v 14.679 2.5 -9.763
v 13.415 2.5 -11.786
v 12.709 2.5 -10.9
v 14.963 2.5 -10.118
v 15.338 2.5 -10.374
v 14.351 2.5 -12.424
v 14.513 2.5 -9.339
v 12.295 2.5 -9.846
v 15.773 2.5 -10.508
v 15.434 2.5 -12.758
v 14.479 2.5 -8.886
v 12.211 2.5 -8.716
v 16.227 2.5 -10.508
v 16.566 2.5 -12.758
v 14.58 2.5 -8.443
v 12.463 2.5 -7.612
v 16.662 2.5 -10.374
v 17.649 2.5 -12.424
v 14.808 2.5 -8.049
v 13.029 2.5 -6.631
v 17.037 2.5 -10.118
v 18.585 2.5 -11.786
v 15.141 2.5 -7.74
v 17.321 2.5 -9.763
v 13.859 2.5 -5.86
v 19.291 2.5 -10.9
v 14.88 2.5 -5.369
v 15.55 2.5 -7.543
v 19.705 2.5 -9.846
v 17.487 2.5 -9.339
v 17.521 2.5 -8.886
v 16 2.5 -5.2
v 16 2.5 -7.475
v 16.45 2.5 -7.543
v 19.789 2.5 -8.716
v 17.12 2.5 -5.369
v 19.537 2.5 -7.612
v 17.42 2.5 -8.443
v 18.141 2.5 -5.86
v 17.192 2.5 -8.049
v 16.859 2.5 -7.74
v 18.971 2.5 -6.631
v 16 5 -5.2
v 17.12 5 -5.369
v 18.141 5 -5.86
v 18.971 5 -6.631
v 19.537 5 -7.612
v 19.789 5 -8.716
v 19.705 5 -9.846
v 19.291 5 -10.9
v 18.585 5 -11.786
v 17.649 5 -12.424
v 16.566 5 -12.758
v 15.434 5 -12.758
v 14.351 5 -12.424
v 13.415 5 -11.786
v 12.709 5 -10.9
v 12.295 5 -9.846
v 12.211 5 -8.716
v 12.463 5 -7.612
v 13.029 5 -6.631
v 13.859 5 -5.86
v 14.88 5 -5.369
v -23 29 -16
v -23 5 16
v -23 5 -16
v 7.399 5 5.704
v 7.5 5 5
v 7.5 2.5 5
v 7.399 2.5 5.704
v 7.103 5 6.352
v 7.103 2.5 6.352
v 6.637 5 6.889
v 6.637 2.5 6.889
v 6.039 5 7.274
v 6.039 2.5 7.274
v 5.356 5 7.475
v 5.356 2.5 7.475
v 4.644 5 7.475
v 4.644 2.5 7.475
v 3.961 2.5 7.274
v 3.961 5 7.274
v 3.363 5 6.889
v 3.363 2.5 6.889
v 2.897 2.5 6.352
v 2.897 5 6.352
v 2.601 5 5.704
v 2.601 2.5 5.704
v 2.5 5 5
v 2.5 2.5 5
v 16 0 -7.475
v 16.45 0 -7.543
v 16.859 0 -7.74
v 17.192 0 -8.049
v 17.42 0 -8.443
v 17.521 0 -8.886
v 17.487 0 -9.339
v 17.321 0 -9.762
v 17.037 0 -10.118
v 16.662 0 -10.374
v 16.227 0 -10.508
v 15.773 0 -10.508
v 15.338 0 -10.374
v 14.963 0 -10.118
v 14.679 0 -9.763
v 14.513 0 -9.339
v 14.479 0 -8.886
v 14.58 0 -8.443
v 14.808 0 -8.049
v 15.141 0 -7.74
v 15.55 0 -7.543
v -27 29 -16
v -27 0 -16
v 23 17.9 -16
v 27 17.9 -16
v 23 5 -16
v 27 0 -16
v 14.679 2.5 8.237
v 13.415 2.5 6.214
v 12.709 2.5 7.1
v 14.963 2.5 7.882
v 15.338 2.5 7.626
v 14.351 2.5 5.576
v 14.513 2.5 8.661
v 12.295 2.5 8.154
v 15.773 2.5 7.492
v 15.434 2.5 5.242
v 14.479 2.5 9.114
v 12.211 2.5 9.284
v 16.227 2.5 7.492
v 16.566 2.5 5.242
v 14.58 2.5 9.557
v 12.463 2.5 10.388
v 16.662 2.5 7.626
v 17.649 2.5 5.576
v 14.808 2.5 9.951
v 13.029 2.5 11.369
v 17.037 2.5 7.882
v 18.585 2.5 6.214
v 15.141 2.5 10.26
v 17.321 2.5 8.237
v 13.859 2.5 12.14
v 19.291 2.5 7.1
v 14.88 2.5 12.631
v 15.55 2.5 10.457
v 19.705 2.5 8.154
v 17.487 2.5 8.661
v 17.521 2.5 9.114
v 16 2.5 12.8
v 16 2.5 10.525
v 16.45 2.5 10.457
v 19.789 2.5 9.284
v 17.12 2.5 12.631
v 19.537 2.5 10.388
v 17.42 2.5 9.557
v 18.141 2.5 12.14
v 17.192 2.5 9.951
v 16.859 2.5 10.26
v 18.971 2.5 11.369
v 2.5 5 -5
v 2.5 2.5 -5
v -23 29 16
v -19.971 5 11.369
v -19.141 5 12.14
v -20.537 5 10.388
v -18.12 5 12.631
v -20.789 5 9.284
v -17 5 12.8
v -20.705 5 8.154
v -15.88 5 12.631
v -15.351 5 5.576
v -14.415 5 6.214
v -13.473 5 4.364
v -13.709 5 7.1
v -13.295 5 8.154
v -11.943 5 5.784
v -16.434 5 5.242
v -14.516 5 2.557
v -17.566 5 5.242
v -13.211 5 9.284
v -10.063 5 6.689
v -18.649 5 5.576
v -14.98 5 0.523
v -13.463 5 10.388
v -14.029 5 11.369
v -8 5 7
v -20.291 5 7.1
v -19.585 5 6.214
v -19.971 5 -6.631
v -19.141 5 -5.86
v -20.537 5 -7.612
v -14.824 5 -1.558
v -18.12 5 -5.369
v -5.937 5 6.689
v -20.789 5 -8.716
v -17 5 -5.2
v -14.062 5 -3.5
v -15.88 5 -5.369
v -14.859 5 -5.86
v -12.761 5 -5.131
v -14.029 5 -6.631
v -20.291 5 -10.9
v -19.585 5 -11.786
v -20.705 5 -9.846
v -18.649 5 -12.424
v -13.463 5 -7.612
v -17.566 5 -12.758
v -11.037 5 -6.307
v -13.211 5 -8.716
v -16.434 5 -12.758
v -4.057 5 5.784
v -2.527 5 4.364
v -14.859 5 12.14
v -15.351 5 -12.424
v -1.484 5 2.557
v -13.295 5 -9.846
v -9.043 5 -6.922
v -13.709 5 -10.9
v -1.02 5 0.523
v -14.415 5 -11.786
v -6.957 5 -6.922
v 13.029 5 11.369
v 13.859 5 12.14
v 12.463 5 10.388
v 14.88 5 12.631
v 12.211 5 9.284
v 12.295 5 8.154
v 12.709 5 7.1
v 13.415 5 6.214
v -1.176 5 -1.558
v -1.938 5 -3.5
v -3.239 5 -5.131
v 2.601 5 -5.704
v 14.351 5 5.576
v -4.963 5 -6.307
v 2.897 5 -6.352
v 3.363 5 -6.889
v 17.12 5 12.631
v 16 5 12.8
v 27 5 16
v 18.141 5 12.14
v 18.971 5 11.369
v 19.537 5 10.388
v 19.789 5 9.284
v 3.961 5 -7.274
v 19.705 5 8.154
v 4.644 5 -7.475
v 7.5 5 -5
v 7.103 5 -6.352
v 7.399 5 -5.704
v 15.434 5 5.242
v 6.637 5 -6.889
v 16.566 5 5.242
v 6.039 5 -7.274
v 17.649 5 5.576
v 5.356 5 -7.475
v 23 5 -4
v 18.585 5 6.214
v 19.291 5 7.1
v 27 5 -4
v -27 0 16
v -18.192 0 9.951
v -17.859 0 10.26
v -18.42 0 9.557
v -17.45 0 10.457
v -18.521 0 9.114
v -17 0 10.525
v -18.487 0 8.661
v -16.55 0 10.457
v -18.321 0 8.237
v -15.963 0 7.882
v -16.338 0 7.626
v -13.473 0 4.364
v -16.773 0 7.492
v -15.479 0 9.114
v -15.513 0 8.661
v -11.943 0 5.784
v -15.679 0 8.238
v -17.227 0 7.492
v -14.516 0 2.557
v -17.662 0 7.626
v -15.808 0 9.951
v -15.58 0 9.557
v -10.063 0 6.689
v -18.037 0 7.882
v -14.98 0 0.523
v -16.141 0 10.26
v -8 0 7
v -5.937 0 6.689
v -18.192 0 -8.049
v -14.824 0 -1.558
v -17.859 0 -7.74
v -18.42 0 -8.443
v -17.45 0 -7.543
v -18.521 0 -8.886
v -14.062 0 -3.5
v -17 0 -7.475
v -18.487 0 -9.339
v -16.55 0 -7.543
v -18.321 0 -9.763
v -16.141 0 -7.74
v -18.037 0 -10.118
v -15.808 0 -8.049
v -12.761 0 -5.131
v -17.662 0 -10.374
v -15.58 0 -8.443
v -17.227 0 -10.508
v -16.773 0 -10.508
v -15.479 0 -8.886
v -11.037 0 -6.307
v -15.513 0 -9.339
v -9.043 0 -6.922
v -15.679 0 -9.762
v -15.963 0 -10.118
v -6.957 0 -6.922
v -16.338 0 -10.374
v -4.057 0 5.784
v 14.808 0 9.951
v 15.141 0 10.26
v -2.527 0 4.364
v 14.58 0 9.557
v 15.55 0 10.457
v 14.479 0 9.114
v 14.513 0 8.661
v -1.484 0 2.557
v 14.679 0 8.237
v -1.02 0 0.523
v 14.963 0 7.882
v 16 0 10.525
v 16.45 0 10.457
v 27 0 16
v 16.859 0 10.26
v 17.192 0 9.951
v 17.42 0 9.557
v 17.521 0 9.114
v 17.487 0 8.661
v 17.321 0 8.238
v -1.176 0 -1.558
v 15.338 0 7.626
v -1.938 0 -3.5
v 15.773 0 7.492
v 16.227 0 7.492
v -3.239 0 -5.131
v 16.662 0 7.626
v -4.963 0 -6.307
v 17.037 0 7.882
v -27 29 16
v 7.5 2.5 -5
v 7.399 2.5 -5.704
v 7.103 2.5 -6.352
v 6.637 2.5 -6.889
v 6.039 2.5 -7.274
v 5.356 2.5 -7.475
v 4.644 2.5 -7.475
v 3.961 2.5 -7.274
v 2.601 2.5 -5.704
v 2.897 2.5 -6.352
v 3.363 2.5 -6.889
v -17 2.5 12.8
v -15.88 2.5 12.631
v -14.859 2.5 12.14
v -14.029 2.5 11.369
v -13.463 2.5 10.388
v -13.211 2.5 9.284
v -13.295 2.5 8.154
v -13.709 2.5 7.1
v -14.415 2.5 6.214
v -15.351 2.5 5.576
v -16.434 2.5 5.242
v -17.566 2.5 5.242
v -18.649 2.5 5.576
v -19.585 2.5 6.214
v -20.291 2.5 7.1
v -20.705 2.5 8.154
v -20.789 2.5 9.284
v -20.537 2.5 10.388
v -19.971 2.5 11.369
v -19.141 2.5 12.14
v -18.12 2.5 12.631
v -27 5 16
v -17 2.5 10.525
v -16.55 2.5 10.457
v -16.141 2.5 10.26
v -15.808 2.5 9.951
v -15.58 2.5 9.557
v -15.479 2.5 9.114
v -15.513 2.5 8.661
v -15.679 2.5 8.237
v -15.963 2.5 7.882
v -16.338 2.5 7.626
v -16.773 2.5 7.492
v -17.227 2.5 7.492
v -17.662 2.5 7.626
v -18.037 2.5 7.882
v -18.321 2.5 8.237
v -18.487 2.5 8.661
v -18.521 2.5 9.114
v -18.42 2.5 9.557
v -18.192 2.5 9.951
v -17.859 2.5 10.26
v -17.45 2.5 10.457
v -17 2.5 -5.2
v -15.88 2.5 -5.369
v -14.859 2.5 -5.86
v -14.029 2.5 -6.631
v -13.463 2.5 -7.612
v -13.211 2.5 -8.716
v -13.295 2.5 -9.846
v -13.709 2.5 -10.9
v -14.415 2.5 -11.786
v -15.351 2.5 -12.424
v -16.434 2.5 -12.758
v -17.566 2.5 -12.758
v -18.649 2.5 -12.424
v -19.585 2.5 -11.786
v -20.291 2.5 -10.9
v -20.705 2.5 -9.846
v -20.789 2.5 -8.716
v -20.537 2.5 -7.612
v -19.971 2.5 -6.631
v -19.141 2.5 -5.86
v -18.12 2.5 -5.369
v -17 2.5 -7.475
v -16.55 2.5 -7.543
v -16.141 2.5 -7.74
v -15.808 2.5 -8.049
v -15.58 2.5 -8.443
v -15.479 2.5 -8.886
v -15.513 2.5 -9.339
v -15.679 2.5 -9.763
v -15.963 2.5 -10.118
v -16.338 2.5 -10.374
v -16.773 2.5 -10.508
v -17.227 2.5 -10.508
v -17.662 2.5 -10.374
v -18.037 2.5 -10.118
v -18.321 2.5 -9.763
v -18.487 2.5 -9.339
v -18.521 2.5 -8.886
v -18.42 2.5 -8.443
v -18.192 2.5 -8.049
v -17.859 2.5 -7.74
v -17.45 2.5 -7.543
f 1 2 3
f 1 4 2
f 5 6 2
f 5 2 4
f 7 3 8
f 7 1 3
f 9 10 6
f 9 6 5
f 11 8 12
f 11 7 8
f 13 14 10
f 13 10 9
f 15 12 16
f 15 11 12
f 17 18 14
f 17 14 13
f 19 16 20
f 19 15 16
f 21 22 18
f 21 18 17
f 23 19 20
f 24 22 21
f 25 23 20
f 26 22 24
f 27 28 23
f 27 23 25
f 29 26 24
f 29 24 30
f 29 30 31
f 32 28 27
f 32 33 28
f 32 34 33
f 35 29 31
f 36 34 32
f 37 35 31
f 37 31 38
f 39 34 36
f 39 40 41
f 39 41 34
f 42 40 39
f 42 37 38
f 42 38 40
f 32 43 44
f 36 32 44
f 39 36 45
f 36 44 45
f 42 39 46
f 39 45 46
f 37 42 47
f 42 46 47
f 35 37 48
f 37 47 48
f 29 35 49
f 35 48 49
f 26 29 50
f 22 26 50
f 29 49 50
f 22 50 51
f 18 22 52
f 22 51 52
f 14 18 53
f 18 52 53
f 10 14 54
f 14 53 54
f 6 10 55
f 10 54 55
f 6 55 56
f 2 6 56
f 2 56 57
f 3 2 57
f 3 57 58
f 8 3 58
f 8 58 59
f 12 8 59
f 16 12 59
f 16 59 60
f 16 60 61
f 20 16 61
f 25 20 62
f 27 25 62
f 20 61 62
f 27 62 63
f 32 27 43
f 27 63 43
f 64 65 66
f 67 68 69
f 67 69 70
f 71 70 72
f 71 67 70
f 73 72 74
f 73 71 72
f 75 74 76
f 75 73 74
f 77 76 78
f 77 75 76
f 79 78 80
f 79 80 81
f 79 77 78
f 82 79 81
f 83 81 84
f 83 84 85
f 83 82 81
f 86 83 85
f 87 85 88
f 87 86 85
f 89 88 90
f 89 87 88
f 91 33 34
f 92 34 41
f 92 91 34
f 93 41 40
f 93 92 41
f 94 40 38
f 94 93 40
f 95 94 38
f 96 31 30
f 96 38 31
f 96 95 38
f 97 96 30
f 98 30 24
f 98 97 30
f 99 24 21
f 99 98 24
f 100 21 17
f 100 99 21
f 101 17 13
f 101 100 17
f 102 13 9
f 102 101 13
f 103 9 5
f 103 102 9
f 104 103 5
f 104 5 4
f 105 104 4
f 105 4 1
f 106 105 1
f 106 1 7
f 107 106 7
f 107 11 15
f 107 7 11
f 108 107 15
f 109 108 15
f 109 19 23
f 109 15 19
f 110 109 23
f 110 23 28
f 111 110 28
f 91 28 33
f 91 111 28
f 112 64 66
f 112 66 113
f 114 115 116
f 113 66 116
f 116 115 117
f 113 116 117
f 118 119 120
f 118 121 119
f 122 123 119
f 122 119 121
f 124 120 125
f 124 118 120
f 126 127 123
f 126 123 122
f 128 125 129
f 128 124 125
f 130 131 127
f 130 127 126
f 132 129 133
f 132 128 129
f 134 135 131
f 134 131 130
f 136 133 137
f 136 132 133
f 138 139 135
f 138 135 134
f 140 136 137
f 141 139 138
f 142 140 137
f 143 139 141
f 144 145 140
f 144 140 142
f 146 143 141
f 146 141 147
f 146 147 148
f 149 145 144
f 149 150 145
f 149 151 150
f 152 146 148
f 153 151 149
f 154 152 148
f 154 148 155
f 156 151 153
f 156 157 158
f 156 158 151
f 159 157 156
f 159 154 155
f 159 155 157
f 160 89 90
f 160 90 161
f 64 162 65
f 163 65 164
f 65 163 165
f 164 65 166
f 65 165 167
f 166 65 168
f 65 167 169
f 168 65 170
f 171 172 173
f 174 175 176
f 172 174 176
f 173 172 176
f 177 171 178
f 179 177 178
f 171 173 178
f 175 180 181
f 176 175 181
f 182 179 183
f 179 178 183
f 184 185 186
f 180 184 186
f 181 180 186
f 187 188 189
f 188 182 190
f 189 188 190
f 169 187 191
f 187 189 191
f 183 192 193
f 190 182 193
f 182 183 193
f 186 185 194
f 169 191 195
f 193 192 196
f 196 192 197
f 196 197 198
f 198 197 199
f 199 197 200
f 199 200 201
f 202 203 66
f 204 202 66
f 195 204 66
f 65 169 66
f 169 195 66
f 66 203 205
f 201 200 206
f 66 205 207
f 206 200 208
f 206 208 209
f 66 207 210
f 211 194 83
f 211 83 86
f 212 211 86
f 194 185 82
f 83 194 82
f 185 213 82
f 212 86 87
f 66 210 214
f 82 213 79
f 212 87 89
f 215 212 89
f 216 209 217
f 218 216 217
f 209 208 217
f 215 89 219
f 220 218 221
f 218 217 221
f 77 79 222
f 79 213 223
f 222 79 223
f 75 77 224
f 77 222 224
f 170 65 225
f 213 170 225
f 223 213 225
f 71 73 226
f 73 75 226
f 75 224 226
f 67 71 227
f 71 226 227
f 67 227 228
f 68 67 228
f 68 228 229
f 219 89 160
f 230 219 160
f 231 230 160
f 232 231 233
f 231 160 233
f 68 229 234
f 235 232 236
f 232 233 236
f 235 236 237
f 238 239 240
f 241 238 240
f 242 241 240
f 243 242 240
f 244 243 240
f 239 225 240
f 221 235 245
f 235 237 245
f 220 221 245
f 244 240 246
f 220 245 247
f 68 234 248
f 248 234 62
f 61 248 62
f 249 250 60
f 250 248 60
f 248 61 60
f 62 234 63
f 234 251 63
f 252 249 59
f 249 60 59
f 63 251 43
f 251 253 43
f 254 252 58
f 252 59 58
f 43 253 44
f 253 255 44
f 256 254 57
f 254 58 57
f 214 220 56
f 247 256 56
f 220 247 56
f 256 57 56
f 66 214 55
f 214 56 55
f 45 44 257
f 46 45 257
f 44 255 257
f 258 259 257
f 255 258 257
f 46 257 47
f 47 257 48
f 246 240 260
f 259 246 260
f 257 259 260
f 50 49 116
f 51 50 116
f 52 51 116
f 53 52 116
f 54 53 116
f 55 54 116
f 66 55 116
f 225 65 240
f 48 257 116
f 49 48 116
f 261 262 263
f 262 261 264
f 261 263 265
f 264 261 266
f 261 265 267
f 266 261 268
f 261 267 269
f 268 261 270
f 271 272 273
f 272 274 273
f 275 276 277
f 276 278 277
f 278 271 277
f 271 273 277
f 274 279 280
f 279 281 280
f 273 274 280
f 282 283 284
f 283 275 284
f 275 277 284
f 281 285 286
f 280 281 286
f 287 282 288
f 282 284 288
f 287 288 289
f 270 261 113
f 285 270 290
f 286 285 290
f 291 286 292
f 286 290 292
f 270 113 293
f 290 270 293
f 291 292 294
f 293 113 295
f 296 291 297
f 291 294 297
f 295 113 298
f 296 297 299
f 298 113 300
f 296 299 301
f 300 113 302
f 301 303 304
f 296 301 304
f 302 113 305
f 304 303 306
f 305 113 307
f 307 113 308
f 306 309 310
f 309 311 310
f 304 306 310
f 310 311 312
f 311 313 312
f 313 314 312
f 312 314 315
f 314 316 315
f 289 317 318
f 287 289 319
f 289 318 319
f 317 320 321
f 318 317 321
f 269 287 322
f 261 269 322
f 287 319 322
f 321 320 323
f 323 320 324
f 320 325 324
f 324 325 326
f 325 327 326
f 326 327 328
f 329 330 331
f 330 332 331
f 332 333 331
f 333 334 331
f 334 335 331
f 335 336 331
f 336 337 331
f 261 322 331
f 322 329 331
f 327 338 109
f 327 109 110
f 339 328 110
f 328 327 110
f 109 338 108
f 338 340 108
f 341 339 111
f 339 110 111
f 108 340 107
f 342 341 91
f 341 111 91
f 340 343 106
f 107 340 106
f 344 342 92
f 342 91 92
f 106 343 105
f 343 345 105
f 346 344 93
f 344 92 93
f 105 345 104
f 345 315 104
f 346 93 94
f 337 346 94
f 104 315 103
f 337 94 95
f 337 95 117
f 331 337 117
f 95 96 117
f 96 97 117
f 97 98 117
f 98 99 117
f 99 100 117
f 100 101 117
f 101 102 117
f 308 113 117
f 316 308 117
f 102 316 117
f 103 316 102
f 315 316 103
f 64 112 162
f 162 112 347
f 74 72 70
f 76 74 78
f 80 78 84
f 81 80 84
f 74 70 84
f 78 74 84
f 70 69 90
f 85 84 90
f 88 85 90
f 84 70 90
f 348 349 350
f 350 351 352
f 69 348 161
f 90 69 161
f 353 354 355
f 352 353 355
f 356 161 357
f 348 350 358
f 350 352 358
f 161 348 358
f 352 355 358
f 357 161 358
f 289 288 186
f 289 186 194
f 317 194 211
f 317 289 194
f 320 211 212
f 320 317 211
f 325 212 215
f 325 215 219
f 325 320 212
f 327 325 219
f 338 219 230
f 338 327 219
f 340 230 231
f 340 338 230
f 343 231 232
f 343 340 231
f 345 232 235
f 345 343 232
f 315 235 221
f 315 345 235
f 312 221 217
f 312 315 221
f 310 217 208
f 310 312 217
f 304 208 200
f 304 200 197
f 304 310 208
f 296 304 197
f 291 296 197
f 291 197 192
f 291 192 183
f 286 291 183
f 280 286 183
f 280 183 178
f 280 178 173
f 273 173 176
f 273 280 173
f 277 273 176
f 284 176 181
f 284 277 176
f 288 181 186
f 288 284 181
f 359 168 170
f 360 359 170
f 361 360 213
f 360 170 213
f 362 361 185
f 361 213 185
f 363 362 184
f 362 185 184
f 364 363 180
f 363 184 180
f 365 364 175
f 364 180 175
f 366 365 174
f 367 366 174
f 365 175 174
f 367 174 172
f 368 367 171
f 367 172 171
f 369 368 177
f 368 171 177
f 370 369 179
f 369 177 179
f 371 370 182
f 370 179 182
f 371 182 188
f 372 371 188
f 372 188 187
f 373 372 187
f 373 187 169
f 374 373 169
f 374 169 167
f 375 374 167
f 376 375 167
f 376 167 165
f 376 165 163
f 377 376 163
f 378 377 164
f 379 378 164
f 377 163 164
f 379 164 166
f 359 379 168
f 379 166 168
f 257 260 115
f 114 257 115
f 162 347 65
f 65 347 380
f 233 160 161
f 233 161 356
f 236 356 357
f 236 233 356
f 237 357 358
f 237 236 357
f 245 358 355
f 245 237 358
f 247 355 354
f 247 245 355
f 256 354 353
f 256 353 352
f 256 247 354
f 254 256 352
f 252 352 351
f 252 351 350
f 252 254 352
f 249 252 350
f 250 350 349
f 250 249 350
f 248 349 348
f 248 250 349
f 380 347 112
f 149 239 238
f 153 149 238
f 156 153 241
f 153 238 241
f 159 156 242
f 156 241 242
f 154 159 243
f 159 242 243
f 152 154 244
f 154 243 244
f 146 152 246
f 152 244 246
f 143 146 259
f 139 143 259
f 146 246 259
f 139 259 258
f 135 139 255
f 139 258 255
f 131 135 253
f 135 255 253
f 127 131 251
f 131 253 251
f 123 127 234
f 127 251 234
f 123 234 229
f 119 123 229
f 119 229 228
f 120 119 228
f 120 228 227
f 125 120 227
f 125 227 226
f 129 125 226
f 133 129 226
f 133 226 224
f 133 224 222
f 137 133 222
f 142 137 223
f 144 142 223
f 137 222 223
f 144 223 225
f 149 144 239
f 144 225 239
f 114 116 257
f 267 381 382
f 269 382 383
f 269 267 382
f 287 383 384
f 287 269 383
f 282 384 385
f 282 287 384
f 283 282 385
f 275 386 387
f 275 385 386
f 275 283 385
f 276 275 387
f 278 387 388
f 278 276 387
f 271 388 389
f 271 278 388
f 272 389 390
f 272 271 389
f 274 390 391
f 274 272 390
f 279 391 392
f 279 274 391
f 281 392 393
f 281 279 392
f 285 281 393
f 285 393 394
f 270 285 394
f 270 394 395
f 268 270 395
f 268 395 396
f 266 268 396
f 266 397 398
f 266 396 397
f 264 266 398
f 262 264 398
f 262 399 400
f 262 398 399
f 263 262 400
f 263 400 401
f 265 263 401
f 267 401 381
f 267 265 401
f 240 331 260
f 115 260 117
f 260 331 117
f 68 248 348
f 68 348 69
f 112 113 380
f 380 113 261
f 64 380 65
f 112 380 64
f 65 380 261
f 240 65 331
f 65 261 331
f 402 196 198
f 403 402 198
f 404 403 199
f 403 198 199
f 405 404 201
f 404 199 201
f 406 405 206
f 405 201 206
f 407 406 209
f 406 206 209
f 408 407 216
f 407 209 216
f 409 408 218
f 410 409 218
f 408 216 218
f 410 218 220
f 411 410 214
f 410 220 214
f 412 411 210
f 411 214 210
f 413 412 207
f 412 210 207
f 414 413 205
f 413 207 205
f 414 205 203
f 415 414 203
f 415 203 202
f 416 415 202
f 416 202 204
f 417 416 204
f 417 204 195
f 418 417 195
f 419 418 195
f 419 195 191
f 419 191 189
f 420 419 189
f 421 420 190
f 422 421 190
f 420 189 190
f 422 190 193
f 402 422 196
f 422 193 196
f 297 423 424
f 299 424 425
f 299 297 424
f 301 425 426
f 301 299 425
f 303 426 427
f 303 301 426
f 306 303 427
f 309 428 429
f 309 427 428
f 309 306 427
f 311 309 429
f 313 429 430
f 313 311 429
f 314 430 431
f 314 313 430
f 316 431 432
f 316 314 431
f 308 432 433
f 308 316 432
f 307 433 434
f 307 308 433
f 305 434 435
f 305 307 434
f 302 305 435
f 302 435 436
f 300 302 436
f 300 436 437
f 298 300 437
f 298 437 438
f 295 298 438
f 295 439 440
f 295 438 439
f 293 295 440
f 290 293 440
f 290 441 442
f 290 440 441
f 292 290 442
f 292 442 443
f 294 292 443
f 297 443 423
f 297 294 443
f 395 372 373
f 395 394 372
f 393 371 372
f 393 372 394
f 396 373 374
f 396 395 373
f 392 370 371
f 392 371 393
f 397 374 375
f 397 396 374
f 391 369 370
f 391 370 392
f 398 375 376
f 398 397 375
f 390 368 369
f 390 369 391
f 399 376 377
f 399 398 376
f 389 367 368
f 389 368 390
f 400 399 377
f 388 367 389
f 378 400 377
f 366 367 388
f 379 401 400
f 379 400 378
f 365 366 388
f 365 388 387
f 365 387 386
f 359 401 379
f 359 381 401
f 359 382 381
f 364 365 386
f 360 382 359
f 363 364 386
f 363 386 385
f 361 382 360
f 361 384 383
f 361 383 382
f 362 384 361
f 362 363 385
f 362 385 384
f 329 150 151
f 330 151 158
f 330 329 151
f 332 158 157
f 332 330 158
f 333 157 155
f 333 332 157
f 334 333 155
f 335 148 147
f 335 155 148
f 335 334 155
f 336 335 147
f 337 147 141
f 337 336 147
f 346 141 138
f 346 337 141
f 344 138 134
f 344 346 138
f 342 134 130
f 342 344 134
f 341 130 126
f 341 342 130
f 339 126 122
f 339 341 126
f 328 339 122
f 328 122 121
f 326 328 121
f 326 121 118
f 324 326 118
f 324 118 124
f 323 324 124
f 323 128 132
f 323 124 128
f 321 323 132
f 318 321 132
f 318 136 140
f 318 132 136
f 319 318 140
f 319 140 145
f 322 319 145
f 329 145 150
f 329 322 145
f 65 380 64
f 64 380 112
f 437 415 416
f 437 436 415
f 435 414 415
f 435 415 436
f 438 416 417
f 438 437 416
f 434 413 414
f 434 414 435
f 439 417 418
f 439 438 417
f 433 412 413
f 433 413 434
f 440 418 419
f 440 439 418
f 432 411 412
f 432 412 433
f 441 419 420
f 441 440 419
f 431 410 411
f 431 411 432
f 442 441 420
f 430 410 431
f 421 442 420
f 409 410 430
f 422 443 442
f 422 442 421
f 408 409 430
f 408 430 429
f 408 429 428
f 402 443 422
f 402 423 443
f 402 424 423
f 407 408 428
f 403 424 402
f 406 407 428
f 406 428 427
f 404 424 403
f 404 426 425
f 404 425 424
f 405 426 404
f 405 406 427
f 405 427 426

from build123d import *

# Parameters (mm, degrees)
SKETCH2_W           = 46
SKETCH2_H           = 32
SKETCH2_R           = 1.525
SKETCH2_R_2         = 7
BOSS_EXTRUDE1_DEPTH = 5
SKETCH3_R           = 3.8
CUT_EXTRUDE1_DEPTH  = 2.5
BOSS_EXTRUDE2_DEPTH = 87.8
BOSS_EXTRUDE3_START = 82.8
SKETCH2_2_W         = 46
SKETCH2_2_H         = 32
SKETCH2_2_R         = 1.525
SKETCH2_2_R_2       = 7
BOSS_EXTRUDE3_DEPTH = 5
CUT_EXTRUDE2_START  = 80.3
SKETCH3_3_R         = 3.8
CUT_EXTRUDE2_DEPTH  = 2.5
CUT_EXTRUDE3_DEPTH  = 5
CUT_EXTRUDE4_DEPTH  = 5
CUT_EXTRUDE5_DEPTH  = 66
BOSS_EXTRUDE5_DEPTH = 4


with BuildPart() as part:
    # Sketch2 → Boss-Extrude1 (new body)
    with BuildSketch(Plane(origin=(0, 0, 0), x_dir=(1, 0, 0), z_dir=(0, 1, 0))):
        Rectangle(SKETCH2_W, SKETCH2_H)
        with Locations(Location((-17, 9, 0), (0, 0, 270))):
            Circle(SKETCH2_R, mode=Mode.SUBTRACT)
        with Locations(Location((-17, -9, 0), (0, 0, 270))):
            Circle(SKETCH2_R, mode=Mode.SUBTRACT)
        with Locations(Location((16, -9, 0), (0, 0, 270))):
            Circle(SKETCH2_R, mode=Mode.SUBTRACT)
        with Locations(Location((16, 9, 0), (0, 0, 270))):
            Circle(SKETCH2_R, mode=Mode.SUBTRACT)
        with Locations(Location((-8, 0, 0), (0, 0, 270))):
            Circle(SKETCH2_R_2, mode=Mode.SUBTRACT)
    extrude(amount=BOSS_EXTRUDE1_DEPTH)

    # Sketch3 → Cut-Extrude1 (cut)
    with BuildSketch(Plane(origin=(0, 5, 0), x_dir=(1, 0, 0), z_dir=(0, 1, 0))):
        with Locations(Location((-17, 9, 0), (0, 0, 270))):
            Circle(SKETCH3_R)
        with Locations(Location((-17, -9, 0), (0, 0, 270))):
            Circle(SKETCH3_R)
        with Locations(Location((16, -9, 0), (0, 0, 270))):
            Circle(SKETCH3_R)
        with Locations(Location((16, 9, 0), (0, 0, 270))):
            Circle(SKETCH3_R)
        with BuildLine():
            Line((7.5, 5), (7.5, -5))
            ThreePointArc((7.5, -5), (5, -7.5), (2.5, -5))
            Line((2.5, -5), (2.5, 5))
            ThreePointArc((2.5, 5), (5, 7.5), (7.5, 5))
        make_face()
    extrude(amount=-CUT_EXTRUDE1_DEPTH, mode=Mode.SUBTRACT)

    # Sketch4 → Boss-Extrude2 (add)
    with BuildSketch(Plane(origin=(0, 0, 0), x_dir=(-1, 0, 0), z_dir=(0, -1, 0))):
        Polygon((23, 16), (-23, 16), (-23, -16), (-27, -16), (-27, 18.5), (27, 18.5), (27, -16), (23, -16), align=None)
    extrude(amount=-BOSS_EXTRUDE2_DEPTH)

    # Sketch2<2> → Boss-Extrude3 (add)
    with BuildSketch(Plane(origin=(0, 0, 0), x_dir=(1, 0, 0), z_dir=(0, 1, 0)).offset(BOSS_EXTRUDE3_START)):
        Rectangle(SKETCH2_2_W, SKETCH2_2_H)
        with Locations(Location((-17, 9, 0), (0, 0, 270))):
            Circle(SKETCH2_2_R, mode=Mode.SUBTRACT)
        with Locations(Location((-17, -9, 0), (0, 0, 270))):
            Circle(SKETCH2_2_R, mode=Mode.SUBTRACT)
        with Locations(Location((16, -9, 0), (0, 0, 270))):
            Circle(SKETCH2_2_R, mode=Mode.SUBTRACT)
        with Locations(Location((16, 9, 0), (0, 0, 270))):
            Circle(SKETCH2_2_R, mode=Mode.SUBTRACT)
        with Locations(Location((-8, 0, 0), (0, 0, 270))):
            Circle(SKETCH2_2_R_2, mode=Mode.SUBTRACT)
    extrude(amount=BOSS_EXTRUDE3_DEPTH)

    # Sketch3<3> → Cut-Extrude2 (cut)
    with BuildSketch(Plane(origin=(0, 5, 0), x_dir=(1, 0, 0), z_dir=(0, 1, 0)).offset(CUT_EXTRUDE2_START)):
        with Locations(Location((-17, 9, 0), (0, 0, 270))):
            Circle(SKETCH3_3_R)
        with Locations(Location((-17, -9, 0), (0, 0, 270))):
            Circle(SKETCH3_3_R)
        with Locations(Location((16, -9, 0), (0, 0, 270))):
            Circle(SKETCH3_3_R)
        with Locations(Location((16, 9, 0), (0, 0, 270))):
            Circle(SKETCH3_3_R)
        with BuildLine():
            Line((7.5, 5), (7.5, -5))
            ThreePointArc((7.5, -5), (5, -7.5), (2.5, -5))
            Line((2.5, -5), (2.5, 5))
            ThreePointArc((2.5, 5), (5, 7.5), (7.5, 5))
        make_face()
    extrude(amount=-CUT_EXTRUDE2_DEPTH, mode=Mode.SUBTRACT)

    # Sketch5 → Cut-Extrude3 (cut)
    with BuildSketch(Plane(origin=(27, 0, 0), x_dir=(0, 0, -1), z_dir=(1, 0, 0))):
        Polygon((-16, 43.9), (-16, 5), (4, 5), (16, 17.9), (16, 43.9), align=None)
        Polygon((-16, 82.8), (-16, 43.9), (16, 43.9), (16, 73.9), (7, 82.8), align=None)
    extrude(amount=-CUT_EXTRUDE3_DEPTH, mode=Mode.SUBTRACT)

    # Sketch6 → Cut-Extrude4 (cut)
    with BuildSketch(Plane.ZY.offset(27)):
        Polygon((16, 82.8), (16, 5), (-16, 29), (-16, 58.8), align=None)
    extrude(amount=-CUT_EXTRUDE4_DEPTH, mode=Mode.SUBTRACT)

    # Sketch7 → Cut-Extrude5 (cut)
    with BuildSketch(Plane(origin=(27, 0, 0), x_dir=(0, 0, -1), z_dir=(1, 0, 0))):
        Polygon((16, 45.9), (16, 58.8), (-16, 82.8), (-16, 87.8), (18.5, 87.8), (18.5, 0), (16, 0), align=None)
    extrude(amount=-CUT_EXTRUDE5_DEPTH, mode=Mode.SUBTRACT)


with BuildPart() as body_2:
    # Sketch9 → Boss-Extrude5 (new body)
    with BuildSketch(Plane.ZY.offset(27)):
        Polygon((16, 5), (-16, 29), (16, 29), align=None)
    extrude(amount=-BOSS_EXTRUDE5_DEPTH)


solid = Compound([part.part, body_2.part])
